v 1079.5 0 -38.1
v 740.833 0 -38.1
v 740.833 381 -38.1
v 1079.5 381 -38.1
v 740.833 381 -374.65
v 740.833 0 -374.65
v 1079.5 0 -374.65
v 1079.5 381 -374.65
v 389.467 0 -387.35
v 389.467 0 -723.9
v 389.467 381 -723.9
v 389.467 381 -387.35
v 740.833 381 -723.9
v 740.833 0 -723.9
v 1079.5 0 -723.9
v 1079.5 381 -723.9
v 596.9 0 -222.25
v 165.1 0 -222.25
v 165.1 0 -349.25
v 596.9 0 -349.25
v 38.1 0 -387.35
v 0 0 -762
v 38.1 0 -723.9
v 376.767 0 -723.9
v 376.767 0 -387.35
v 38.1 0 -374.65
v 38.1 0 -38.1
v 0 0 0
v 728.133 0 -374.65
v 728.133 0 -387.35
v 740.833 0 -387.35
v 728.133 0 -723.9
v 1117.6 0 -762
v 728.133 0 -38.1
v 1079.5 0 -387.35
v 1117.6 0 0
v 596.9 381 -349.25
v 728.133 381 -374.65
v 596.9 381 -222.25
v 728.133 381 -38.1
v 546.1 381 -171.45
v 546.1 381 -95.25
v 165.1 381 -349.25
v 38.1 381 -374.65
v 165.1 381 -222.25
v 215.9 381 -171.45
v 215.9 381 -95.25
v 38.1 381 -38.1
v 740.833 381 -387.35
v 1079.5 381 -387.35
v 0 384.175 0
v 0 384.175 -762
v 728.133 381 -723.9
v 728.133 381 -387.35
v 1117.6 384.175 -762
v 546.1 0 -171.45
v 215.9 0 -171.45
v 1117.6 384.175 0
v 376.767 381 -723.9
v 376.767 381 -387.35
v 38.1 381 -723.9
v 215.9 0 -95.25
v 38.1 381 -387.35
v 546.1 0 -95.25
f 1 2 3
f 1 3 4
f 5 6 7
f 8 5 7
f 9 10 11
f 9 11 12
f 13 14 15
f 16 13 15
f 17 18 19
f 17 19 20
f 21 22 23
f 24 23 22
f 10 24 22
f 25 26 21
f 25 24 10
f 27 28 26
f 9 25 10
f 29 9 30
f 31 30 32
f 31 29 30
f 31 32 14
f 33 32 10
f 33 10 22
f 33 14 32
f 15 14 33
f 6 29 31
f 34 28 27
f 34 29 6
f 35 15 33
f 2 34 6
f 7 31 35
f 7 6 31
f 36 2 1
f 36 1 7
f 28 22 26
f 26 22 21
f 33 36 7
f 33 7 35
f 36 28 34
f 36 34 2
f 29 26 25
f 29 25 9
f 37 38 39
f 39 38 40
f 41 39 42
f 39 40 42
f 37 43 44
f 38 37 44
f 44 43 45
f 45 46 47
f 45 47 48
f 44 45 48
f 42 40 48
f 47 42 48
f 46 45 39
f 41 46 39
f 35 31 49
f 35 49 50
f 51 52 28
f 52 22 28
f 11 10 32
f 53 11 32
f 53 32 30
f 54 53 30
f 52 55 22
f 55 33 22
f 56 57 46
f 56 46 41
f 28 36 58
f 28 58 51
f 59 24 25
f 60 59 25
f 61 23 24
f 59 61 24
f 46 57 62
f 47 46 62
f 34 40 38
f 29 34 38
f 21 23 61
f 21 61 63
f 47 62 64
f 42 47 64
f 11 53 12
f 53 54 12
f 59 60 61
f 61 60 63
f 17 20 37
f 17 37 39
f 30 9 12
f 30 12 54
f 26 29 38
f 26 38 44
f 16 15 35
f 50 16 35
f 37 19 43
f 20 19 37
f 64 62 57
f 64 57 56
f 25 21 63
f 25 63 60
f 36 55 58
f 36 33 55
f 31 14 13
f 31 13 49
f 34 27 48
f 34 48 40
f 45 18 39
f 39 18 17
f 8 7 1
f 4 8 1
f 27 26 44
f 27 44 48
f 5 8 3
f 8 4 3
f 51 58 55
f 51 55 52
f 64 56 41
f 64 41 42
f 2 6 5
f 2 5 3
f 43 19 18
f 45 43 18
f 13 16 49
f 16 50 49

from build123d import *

# Parameters (mm, degrees)
F0_W     = 1117.6
F0_H     = 762
F0_W_2   = 338.666667
F0_H_2   = 336.55
F0_W_3   = 338.666666
F1_DEPTH = 381
F2_W     = 1117.6
F2_H     = 762
F3_DEPTH = 3.175
F4_W     = 330.2
F4_H     = 76.2
F4_W_2   = 431.8
F4_H_2   = 127
F5_DEPTH = 381


with BuildPart() as f1:
    # F0 (on Front) → F1 (new body)
    with BuildSketch(Plane.XZ):
        with Locations((558.8, -381)):
            Rectangle(F0_W, F0_H)
        with Locations((207.433334, -555.625)):
            Rectangle(F0_W_2, F0_H_2, mode=Mode.SUBTRACT)
        with Locations((558.8, -555.625)):
            Rectangle(F0_W_3, F0_H_2, mode=Mode.SUBTRACT)
        with Locations((910.166667, -555.625)):
            Rectangle(F0_W_2, F0_H_2, mode=Mode.SUBTRACT)
        Polygon((38.1, -374.65), (38.1, -38.1), (376.766667, -38.1), (389.466667, -38.1), (728.133333, -38.1), (728.133333, -374.65), (389.466667, -374.65), (376.766667, -374.65), align=None, mode=Mode.SUBTRACT)
        with Locations((910.166667, -206.375)):
            Rectangle(F0_W_2, F0_H_2, mode=Mode.SUBTRACT)
    extrude(amount=-F1_DEPTH)

    # F2 (on face) → F3 (join)
    with BuildSketch(Plane(origin=(0, 381, 0), x_dir=(-1, 0, 0), z_dir=(0, 1, 0))):
        with Locations((-558.8, -381)):
            Rectangle(F2_W, F2_H)
    extrude(amount=F3_DEPTH)

    # F4 (on Front) → F5 (join)
    with BuildSketch(Plane.XZ):
        with Locations((381, -133.35)):
            Rectangle(F4_W, F4_H)
        with Locations((381, -285.75)):
            Rectangle(F4_W_2, F4_H_2)
    extrude(amount=-F5_DEPTH)


solid = f1.part
